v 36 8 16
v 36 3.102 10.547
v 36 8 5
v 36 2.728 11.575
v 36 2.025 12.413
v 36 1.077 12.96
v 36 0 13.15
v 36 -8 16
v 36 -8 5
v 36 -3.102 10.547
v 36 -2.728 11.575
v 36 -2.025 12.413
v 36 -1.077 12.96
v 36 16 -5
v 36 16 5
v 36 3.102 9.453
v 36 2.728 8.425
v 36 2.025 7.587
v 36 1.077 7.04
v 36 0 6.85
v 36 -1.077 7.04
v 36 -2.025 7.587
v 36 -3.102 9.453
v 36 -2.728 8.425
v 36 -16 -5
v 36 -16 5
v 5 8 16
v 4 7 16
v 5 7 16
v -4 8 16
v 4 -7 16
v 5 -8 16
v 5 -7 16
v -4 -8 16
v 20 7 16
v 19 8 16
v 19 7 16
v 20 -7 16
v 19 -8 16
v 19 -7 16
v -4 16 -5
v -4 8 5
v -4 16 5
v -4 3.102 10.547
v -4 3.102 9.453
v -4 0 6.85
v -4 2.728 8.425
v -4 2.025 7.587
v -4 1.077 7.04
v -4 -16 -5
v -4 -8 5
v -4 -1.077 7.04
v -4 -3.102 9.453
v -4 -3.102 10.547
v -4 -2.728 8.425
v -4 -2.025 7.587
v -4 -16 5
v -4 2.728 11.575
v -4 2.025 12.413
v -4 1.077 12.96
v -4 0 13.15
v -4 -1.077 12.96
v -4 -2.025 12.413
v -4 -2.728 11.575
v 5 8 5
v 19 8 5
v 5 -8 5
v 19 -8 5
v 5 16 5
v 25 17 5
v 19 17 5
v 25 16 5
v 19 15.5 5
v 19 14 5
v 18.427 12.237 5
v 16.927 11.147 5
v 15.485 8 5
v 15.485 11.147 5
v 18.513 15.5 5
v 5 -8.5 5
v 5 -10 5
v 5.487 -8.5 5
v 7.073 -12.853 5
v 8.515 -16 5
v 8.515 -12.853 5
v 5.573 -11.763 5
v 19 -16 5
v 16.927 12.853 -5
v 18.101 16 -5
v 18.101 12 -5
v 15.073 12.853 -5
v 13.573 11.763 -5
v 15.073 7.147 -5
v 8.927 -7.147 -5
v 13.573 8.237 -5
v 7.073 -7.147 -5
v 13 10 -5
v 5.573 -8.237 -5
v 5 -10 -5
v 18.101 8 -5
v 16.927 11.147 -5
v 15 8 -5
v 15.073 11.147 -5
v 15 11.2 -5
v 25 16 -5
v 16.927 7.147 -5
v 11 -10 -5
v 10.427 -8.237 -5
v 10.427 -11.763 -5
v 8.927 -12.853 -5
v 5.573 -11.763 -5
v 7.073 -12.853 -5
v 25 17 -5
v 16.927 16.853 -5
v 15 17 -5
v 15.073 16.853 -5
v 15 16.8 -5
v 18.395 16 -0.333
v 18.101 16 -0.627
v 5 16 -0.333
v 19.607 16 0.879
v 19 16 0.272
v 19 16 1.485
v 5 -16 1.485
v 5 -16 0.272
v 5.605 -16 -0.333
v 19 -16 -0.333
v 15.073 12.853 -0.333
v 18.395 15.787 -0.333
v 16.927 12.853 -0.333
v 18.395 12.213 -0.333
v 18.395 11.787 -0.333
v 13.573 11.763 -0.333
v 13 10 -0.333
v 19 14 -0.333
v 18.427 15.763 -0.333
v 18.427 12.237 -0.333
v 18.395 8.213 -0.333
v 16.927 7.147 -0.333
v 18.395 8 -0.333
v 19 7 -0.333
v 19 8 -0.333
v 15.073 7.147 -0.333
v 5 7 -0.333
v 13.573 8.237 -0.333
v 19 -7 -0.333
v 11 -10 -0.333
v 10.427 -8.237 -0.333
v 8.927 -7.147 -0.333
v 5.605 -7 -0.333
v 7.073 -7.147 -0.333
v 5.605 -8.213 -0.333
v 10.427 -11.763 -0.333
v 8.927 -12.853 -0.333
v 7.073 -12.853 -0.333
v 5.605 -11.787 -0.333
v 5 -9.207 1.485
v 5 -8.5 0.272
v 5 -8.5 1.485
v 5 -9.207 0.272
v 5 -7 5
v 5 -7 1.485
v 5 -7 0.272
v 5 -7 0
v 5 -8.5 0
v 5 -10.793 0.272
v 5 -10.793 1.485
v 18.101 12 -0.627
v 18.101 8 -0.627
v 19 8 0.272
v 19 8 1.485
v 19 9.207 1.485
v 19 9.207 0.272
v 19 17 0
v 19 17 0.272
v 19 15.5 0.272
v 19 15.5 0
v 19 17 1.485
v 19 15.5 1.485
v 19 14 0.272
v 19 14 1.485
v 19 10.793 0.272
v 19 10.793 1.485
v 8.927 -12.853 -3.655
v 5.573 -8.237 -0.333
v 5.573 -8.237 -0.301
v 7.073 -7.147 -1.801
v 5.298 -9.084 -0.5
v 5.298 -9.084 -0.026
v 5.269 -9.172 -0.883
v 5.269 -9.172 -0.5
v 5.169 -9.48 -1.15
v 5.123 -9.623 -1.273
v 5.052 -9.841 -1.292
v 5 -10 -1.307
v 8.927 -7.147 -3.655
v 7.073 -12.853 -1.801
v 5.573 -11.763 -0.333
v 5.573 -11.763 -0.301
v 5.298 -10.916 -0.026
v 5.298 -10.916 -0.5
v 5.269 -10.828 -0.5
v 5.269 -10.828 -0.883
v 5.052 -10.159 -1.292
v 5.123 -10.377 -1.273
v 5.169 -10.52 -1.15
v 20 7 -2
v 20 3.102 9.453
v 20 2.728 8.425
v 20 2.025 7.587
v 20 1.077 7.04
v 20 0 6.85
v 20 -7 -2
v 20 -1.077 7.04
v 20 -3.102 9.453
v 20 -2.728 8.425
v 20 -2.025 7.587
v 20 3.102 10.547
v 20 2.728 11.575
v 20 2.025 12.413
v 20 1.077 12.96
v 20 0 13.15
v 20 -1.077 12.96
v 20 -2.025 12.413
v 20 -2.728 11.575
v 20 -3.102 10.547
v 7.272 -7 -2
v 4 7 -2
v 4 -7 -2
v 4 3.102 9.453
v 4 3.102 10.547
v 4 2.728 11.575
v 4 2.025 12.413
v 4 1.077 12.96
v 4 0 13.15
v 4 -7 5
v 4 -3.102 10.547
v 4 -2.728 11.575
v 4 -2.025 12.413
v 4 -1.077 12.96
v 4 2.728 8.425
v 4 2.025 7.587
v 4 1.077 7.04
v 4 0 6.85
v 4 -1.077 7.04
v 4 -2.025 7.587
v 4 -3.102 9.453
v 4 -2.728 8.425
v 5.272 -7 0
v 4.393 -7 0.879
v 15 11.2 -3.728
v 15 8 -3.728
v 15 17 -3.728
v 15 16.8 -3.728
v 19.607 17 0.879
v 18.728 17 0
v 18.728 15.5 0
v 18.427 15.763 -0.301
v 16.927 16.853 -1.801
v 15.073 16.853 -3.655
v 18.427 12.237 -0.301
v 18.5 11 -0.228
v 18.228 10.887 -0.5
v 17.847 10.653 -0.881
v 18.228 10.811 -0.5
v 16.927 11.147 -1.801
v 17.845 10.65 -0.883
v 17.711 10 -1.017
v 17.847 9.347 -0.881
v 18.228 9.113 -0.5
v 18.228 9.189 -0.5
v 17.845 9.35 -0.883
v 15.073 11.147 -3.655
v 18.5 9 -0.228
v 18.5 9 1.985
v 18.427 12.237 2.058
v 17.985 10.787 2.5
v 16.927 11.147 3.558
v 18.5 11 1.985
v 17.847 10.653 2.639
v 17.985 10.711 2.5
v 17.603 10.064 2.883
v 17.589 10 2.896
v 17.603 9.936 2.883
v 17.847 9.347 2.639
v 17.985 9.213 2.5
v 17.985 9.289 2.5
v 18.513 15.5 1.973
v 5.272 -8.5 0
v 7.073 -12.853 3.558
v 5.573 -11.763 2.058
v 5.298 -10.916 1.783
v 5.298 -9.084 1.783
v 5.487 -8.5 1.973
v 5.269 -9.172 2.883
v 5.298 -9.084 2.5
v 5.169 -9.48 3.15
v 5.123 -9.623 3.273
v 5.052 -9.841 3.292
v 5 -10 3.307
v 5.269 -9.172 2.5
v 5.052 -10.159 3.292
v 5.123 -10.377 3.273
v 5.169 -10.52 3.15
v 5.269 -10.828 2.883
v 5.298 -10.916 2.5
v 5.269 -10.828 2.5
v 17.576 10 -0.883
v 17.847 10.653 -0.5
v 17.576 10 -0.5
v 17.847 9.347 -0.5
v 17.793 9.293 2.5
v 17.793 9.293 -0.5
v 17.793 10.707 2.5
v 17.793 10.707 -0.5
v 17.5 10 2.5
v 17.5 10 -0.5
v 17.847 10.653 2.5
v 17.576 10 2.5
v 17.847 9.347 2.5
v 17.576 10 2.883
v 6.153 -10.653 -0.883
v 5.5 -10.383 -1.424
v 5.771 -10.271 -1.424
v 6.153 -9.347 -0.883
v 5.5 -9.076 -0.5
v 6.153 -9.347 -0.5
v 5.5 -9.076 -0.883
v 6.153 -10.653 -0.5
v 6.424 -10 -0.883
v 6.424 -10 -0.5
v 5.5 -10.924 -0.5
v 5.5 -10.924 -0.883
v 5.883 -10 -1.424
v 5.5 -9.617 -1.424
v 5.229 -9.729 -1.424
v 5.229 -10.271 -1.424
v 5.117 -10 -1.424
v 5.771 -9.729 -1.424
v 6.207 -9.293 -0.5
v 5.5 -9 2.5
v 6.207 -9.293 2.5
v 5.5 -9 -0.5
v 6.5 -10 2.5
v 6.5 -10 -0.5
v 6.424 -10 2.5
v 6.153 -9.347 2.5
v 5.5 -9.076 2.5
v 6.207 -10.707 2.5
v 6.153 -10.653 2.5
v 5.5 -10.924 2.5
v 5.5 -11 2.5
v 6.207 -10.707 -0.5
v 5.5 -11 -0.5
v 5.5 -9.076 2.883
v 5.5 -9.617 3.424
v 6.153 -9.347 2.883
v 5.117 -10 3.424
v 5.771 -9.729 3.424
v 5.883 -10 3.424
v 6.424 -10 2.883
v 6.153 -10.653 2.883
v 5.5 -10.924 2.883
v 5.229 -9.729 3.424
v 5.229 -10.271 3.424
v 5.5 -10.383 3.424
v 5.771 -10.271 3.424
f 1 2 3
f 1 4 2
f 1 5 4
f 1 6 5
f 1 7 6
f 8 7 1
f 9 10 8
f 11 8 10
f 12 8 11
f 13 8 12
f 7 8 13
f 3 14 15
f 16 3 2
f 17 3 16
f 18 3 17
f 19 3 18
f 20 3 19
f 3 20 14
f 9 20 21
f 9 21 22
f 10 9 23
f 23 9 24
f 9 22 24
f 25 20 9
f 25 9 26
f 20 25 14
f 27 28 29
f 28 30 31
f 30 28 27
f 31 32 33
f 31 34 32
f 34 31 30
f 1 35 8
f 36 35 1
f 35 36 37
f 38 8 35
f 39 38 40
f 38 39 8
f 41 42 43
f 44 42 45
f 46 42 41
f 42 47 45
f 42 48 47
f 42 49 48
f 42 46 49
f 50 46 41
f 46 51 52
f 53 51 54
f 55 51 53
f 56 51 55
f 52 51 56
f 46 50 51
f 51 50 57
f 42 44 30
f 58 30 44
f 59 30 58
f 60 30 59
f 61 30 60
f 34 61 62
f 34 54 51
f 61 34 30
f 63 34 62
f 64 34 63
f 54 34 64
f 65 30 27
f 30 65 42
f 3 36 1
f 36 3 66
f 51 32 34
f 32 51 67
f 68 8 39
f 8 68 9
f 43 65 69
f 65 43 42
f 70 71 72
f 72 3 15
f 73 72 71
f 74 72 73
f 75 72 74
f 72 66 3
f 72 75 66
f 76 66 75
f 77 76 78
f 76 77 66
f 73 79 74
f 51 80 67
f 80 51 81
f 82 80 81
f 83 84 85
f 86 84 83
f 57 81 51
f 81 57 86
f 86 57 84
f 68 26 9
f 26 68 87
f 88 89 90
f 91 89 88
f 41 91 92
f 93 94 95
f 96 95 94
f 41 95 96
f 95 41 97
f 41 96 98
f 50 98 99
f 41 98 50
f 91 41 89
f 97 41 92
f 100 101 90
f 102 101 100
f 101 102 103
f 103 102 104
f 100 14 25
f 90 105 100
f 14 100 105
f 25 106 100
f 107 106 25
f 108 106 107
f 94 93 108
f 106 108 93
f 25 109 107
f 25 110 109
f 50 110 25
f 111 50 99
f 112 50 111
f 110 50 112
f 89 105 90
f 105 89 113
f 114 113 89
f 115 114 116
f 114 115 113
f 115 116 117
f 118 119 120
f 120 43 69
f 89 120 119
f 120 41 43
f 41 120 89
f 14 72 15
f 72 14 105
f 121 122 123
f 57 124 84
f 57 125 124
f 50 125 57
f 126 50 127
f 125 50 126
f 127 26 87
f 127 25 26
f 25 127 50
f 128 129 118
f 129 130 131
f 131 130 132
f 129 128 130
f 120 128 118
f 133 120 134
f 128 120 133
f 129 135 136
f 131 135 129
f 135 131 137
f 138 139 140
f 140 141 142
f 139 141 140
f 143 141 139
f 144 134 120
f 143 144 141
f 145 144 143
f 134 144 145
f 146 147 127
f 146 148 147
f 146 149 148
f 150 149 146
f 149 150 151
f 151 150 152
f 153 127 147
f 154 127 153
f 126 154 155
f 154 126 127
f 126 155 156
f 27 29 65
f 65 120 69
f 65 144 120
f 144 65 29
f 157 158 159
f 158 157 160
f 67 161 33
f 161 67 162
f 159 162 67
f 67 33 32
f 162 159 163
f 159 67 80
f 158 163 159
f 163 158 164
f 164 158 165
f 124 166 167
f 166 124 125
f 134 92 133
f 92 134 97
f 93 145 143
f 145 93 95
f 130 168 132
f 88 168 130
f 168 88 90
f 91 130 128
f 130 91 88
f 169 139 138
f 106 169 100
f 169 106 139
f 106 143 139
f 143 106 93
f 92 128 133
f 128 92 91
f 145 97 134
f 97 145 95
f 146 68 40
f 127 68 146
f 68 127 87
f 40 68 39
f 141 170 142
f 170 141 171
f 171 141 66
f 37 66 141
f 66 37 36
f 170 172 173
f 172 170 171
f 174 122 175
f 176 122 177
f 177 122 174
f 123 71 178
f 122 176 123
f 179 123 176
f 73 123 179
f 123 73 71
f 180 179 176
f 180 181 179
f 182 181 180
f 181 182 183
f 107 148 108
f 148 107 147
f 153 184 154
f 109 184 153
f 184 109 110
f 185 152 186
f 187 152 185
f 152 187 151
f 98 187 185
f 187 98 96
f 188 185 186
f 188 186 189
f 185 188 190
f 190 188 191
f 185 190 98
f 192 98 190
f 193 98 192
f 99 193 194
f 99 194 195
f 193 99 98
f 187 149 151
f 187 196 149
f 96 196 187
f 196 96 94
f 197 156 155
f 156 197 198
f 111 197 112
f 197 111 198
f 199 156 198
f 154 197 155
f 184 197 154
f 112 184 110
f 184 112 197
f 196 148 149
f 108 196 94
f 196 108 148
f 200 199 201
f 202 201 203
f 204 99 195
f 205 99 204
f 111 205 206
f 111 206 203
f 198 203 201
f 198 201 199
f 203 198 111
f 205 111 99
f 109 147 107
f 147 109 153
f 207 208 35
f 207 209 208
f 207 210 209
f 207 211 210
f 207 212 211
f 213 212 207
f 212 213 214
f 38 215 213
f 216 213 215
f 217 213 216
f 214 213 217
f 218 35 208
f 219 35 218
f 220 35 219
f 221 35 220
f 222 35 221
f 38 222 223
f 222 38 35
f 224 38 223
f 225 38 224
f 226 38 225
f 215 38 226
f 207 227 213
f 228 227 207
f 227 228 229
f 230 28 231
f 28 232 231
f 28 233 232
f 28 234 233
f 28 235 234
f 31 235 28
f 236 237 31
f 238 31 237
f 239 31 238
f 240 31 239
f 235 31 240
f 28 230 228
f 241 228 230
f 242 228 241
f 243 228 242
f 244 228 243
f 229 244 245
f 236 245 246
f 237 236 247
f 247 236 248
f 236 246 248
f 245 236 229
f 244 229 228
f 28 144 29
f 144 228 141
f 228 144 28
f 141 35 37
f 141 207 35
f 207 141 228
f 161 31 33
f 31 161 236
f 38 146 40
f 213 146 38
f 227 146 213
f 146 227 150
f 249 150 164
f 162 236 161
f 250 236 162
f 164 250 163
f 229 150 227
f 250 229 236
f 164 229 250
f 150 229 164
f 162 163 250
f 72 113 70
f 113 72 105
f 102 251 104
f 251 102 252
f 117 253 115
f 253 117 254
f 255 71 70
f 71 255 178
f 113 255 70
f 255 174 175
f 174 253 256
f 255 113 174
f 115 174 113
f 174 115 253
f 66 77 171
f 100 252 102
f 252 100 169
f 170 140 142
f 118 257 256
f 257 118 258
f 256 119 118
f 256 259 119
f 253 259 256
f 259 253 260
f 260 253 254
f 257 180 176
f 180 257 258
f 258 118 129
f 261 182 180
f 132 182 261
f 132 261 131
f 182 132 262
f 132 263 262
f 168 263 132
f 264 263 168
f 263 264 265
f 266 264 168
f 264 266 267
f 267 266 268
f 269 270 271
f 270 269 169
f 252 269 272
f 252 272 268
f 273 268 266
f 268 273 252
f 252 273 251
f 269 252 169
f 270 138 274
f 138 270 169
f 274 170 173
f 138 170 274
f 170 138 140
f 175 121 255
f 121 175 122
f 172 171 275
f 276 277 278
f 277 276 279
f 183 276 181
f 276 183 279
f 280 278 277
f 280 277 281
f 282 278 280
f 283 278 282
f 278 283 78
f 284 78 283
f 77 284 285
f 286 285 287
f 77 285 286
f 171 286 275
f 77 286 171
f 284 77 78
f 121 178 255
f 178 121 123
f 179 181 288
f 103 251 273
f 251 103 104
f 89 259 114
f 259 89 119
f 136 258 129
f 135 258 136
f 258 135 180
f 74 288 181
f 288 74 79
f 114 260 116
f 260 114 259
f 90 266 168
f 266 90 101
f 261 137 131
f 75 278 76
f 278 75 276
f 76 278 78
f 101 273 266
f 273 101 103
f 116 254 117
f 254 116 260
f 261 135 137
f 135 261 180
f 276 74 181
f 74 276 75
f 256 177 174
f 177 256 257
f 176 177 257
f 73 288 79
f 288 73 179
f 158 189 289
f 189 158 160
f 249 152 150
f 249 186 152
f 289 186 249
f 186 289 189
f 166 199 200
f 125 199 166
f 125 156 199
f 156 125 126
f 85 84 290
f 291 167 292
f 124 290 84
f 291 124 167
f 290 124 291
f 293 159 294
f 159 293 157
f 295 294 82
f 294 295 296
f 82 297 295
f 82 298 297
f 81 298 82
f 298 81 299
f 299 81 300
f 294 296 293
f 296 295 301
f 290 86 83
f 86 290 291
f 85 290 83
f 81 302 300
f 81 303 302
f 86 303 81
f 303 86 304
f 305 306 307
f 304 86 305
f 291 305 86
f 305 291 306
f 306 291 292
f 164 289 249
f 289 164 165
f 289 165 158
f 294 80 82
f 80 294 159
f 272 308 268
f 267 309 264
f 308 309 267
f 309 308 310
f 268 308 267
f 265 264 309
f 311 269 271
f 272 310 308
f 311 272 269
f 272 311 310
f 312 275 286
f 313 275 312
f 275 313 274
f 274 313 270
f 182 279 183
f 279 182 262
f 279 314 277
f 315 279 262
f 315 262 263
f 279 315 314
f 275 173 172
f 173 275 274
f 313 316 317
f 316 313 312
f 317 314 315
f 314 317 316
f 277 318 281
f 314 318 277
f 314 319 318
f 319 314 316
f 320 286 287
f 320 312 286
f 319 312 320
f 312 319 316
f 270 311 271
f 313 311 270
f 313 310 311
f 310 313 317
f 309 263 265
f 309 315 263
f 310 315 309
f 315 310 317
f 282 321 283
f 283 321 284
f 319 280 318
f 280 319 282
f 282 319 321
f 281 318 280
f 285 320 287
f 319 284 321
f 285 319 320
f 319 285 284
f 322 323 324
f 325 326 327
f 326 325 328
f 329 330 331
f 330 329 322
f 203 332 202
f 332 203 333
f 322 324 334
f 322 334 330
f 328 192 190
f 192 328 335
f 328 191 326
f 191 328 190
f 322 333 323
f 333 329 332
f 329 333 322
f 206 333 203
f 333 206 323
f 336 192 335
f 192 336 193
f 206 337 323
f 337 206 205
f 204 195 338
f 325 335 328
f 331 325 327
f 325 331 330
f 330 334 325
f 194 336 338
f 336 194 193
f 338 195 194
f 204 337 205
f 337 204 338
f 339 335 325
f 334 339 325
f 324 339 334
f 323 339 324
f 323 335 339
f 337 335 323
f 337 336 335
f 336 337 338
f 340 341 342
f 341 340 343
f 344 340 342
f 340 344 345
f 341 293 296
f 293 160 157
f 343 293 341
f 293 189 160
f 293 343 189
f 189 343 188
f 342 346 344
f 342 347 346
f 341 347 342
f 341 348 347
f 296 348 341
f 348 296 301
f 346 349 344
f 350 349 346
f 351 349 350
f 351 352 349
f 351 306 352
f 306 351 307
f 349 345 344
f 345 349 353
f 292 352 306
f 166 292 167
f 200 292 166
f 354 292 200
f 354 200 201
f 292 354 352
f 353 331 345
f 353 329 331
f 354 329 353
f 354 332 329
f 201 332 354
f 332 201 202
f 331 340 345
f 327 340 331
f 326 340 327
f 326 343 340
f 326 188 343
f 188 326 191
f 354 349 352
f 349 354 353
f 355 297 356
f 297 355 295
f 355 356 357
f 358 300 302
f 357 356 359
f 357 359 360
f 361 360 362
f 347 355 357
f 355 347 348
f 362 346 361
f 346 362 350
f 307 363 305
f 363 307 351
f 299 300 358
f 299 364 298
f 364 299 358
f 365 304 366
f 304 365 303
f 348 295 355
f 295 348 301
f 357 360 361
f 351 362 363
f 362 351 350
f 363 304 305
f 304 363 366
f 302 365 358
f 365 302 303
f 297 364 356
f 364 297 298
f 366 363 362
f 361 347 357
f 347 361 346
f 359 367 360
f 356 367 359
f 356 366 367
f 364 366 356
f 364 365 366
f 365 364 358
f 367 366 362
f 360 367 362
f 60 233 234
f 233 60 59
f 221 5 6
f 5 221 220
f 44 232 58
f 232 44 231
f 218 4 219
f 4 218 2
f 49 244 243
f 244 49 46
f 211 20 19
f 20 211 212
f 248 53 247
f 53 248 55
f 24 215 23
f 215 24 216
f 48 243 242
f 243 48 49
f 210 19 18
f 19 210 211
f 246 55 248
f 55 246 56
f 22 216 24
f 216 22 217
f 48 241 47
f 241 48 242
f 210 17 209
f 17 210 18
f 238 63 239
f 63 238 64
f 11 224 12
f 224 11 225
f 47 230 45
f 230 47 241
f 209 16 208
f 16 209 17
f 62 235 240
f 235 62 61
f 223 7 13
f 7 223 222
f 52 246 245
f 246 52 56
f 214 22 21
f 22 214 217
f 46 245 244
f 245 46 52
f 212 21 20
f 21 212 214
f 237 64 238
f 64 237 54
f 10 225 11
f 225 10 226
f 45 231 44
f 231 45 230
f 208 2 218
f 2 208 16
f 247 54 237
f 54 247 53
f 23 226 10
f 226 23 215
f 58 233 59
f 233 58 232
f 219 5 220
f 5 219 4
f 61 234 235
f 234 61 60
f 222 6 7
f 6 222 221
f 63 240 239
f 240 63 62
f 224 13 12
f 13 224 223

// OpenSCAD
module blocka(len,wid,ht,slot,n) {
      translate([-4,-8,4]) cube([40,wid/2,12]);
      translate([len/5,0,0])
		   cube([len/2,wid,ht],center=true);
}

module blockr(len, wid, ht, slot, n) {
   tuber = 3;
   yoff = 10;
	difference() {
      blocka(len,wid,ht,slot,n); 
      translate([3*slot/2,0,7])
         cube([16,14,18],center=true);   
		section(slot,wid,ht,tuber,n,yoff);
      translate([3*slot,0,0])
        mirror([1,0,0])
		    section(slot,wid,ht,tuber,n,-yoff);
   }
   translate([0,4,0])
   wedge(slot,wid,ht,tuber,n,yoff-1.5);
   translate([3*slot,0,0])
     mirror([1,0,0])
        wedge(slot,wid,ht,tuber,n,-yoff-1.5);
translate([0,0,2])
   pip(slot,wid,ht,3,n, 0.5+slot/2, yoff);
translate([0,0,2])
   pip(slot,wid,ht,3,n, -(slot/2+3*tuber/2), -yoff);
			
}

module section(slot,wid,ht,tuber, n,yoff) {
		translate([2*n*slot-(7*slot)/8,yoff,4+2*ht/3])
			cube([slot,4*wid,2+2*ht], center=true);
   	translate([2*n*slot,yoff,ht/3])
         cylinder(r=tuber,h=3*ht,center=true);
}

module wedge(slot,wid,ht,tuber,n,yoff) {

  difference() {
		translate([2*n*slot+4,yoff,0])
          cube([10,9,10],center=true);
		translate([2*n*slot-slot+1,yoff,3])
          rotate([0,45,0]) cube([18,10,12],center=true);
		translate([2*n*slot,yoff+1.5,0])
          cylinder(r=tuber,h=3*ht,center=true);
		translate([2*n*slot,yoff+6,3])
          cube([2*tuber,2*tuber,2*tuber],center=true);
  }
}


module pip(slot,wid,ht,tuber,n, xoff, yoff) {
       translate([xoff+2*n*slot-tuber/2-0.5,yoff,-2.5])
         sphere(tuber/3,center=true,$fn=8);
   	translate([xoff+2*n*slot-tuber/2-0.5,yoff,-1])
         cylinder(r=tuber/3,h=1+ht/5,center=true,$fn=8);
       translate([xoff+2*n*slot-tuber/2-0.5,yoff,0.5])
         sphere(tuber/3,center=true,$fn=8);
}
difference() {
   blockr(80,32,10,8,1 );
   translate([20,0,10])
        rotate([0,90,0]) cylinder(r=3.15,h=70,center=true,$fn=18);
}
